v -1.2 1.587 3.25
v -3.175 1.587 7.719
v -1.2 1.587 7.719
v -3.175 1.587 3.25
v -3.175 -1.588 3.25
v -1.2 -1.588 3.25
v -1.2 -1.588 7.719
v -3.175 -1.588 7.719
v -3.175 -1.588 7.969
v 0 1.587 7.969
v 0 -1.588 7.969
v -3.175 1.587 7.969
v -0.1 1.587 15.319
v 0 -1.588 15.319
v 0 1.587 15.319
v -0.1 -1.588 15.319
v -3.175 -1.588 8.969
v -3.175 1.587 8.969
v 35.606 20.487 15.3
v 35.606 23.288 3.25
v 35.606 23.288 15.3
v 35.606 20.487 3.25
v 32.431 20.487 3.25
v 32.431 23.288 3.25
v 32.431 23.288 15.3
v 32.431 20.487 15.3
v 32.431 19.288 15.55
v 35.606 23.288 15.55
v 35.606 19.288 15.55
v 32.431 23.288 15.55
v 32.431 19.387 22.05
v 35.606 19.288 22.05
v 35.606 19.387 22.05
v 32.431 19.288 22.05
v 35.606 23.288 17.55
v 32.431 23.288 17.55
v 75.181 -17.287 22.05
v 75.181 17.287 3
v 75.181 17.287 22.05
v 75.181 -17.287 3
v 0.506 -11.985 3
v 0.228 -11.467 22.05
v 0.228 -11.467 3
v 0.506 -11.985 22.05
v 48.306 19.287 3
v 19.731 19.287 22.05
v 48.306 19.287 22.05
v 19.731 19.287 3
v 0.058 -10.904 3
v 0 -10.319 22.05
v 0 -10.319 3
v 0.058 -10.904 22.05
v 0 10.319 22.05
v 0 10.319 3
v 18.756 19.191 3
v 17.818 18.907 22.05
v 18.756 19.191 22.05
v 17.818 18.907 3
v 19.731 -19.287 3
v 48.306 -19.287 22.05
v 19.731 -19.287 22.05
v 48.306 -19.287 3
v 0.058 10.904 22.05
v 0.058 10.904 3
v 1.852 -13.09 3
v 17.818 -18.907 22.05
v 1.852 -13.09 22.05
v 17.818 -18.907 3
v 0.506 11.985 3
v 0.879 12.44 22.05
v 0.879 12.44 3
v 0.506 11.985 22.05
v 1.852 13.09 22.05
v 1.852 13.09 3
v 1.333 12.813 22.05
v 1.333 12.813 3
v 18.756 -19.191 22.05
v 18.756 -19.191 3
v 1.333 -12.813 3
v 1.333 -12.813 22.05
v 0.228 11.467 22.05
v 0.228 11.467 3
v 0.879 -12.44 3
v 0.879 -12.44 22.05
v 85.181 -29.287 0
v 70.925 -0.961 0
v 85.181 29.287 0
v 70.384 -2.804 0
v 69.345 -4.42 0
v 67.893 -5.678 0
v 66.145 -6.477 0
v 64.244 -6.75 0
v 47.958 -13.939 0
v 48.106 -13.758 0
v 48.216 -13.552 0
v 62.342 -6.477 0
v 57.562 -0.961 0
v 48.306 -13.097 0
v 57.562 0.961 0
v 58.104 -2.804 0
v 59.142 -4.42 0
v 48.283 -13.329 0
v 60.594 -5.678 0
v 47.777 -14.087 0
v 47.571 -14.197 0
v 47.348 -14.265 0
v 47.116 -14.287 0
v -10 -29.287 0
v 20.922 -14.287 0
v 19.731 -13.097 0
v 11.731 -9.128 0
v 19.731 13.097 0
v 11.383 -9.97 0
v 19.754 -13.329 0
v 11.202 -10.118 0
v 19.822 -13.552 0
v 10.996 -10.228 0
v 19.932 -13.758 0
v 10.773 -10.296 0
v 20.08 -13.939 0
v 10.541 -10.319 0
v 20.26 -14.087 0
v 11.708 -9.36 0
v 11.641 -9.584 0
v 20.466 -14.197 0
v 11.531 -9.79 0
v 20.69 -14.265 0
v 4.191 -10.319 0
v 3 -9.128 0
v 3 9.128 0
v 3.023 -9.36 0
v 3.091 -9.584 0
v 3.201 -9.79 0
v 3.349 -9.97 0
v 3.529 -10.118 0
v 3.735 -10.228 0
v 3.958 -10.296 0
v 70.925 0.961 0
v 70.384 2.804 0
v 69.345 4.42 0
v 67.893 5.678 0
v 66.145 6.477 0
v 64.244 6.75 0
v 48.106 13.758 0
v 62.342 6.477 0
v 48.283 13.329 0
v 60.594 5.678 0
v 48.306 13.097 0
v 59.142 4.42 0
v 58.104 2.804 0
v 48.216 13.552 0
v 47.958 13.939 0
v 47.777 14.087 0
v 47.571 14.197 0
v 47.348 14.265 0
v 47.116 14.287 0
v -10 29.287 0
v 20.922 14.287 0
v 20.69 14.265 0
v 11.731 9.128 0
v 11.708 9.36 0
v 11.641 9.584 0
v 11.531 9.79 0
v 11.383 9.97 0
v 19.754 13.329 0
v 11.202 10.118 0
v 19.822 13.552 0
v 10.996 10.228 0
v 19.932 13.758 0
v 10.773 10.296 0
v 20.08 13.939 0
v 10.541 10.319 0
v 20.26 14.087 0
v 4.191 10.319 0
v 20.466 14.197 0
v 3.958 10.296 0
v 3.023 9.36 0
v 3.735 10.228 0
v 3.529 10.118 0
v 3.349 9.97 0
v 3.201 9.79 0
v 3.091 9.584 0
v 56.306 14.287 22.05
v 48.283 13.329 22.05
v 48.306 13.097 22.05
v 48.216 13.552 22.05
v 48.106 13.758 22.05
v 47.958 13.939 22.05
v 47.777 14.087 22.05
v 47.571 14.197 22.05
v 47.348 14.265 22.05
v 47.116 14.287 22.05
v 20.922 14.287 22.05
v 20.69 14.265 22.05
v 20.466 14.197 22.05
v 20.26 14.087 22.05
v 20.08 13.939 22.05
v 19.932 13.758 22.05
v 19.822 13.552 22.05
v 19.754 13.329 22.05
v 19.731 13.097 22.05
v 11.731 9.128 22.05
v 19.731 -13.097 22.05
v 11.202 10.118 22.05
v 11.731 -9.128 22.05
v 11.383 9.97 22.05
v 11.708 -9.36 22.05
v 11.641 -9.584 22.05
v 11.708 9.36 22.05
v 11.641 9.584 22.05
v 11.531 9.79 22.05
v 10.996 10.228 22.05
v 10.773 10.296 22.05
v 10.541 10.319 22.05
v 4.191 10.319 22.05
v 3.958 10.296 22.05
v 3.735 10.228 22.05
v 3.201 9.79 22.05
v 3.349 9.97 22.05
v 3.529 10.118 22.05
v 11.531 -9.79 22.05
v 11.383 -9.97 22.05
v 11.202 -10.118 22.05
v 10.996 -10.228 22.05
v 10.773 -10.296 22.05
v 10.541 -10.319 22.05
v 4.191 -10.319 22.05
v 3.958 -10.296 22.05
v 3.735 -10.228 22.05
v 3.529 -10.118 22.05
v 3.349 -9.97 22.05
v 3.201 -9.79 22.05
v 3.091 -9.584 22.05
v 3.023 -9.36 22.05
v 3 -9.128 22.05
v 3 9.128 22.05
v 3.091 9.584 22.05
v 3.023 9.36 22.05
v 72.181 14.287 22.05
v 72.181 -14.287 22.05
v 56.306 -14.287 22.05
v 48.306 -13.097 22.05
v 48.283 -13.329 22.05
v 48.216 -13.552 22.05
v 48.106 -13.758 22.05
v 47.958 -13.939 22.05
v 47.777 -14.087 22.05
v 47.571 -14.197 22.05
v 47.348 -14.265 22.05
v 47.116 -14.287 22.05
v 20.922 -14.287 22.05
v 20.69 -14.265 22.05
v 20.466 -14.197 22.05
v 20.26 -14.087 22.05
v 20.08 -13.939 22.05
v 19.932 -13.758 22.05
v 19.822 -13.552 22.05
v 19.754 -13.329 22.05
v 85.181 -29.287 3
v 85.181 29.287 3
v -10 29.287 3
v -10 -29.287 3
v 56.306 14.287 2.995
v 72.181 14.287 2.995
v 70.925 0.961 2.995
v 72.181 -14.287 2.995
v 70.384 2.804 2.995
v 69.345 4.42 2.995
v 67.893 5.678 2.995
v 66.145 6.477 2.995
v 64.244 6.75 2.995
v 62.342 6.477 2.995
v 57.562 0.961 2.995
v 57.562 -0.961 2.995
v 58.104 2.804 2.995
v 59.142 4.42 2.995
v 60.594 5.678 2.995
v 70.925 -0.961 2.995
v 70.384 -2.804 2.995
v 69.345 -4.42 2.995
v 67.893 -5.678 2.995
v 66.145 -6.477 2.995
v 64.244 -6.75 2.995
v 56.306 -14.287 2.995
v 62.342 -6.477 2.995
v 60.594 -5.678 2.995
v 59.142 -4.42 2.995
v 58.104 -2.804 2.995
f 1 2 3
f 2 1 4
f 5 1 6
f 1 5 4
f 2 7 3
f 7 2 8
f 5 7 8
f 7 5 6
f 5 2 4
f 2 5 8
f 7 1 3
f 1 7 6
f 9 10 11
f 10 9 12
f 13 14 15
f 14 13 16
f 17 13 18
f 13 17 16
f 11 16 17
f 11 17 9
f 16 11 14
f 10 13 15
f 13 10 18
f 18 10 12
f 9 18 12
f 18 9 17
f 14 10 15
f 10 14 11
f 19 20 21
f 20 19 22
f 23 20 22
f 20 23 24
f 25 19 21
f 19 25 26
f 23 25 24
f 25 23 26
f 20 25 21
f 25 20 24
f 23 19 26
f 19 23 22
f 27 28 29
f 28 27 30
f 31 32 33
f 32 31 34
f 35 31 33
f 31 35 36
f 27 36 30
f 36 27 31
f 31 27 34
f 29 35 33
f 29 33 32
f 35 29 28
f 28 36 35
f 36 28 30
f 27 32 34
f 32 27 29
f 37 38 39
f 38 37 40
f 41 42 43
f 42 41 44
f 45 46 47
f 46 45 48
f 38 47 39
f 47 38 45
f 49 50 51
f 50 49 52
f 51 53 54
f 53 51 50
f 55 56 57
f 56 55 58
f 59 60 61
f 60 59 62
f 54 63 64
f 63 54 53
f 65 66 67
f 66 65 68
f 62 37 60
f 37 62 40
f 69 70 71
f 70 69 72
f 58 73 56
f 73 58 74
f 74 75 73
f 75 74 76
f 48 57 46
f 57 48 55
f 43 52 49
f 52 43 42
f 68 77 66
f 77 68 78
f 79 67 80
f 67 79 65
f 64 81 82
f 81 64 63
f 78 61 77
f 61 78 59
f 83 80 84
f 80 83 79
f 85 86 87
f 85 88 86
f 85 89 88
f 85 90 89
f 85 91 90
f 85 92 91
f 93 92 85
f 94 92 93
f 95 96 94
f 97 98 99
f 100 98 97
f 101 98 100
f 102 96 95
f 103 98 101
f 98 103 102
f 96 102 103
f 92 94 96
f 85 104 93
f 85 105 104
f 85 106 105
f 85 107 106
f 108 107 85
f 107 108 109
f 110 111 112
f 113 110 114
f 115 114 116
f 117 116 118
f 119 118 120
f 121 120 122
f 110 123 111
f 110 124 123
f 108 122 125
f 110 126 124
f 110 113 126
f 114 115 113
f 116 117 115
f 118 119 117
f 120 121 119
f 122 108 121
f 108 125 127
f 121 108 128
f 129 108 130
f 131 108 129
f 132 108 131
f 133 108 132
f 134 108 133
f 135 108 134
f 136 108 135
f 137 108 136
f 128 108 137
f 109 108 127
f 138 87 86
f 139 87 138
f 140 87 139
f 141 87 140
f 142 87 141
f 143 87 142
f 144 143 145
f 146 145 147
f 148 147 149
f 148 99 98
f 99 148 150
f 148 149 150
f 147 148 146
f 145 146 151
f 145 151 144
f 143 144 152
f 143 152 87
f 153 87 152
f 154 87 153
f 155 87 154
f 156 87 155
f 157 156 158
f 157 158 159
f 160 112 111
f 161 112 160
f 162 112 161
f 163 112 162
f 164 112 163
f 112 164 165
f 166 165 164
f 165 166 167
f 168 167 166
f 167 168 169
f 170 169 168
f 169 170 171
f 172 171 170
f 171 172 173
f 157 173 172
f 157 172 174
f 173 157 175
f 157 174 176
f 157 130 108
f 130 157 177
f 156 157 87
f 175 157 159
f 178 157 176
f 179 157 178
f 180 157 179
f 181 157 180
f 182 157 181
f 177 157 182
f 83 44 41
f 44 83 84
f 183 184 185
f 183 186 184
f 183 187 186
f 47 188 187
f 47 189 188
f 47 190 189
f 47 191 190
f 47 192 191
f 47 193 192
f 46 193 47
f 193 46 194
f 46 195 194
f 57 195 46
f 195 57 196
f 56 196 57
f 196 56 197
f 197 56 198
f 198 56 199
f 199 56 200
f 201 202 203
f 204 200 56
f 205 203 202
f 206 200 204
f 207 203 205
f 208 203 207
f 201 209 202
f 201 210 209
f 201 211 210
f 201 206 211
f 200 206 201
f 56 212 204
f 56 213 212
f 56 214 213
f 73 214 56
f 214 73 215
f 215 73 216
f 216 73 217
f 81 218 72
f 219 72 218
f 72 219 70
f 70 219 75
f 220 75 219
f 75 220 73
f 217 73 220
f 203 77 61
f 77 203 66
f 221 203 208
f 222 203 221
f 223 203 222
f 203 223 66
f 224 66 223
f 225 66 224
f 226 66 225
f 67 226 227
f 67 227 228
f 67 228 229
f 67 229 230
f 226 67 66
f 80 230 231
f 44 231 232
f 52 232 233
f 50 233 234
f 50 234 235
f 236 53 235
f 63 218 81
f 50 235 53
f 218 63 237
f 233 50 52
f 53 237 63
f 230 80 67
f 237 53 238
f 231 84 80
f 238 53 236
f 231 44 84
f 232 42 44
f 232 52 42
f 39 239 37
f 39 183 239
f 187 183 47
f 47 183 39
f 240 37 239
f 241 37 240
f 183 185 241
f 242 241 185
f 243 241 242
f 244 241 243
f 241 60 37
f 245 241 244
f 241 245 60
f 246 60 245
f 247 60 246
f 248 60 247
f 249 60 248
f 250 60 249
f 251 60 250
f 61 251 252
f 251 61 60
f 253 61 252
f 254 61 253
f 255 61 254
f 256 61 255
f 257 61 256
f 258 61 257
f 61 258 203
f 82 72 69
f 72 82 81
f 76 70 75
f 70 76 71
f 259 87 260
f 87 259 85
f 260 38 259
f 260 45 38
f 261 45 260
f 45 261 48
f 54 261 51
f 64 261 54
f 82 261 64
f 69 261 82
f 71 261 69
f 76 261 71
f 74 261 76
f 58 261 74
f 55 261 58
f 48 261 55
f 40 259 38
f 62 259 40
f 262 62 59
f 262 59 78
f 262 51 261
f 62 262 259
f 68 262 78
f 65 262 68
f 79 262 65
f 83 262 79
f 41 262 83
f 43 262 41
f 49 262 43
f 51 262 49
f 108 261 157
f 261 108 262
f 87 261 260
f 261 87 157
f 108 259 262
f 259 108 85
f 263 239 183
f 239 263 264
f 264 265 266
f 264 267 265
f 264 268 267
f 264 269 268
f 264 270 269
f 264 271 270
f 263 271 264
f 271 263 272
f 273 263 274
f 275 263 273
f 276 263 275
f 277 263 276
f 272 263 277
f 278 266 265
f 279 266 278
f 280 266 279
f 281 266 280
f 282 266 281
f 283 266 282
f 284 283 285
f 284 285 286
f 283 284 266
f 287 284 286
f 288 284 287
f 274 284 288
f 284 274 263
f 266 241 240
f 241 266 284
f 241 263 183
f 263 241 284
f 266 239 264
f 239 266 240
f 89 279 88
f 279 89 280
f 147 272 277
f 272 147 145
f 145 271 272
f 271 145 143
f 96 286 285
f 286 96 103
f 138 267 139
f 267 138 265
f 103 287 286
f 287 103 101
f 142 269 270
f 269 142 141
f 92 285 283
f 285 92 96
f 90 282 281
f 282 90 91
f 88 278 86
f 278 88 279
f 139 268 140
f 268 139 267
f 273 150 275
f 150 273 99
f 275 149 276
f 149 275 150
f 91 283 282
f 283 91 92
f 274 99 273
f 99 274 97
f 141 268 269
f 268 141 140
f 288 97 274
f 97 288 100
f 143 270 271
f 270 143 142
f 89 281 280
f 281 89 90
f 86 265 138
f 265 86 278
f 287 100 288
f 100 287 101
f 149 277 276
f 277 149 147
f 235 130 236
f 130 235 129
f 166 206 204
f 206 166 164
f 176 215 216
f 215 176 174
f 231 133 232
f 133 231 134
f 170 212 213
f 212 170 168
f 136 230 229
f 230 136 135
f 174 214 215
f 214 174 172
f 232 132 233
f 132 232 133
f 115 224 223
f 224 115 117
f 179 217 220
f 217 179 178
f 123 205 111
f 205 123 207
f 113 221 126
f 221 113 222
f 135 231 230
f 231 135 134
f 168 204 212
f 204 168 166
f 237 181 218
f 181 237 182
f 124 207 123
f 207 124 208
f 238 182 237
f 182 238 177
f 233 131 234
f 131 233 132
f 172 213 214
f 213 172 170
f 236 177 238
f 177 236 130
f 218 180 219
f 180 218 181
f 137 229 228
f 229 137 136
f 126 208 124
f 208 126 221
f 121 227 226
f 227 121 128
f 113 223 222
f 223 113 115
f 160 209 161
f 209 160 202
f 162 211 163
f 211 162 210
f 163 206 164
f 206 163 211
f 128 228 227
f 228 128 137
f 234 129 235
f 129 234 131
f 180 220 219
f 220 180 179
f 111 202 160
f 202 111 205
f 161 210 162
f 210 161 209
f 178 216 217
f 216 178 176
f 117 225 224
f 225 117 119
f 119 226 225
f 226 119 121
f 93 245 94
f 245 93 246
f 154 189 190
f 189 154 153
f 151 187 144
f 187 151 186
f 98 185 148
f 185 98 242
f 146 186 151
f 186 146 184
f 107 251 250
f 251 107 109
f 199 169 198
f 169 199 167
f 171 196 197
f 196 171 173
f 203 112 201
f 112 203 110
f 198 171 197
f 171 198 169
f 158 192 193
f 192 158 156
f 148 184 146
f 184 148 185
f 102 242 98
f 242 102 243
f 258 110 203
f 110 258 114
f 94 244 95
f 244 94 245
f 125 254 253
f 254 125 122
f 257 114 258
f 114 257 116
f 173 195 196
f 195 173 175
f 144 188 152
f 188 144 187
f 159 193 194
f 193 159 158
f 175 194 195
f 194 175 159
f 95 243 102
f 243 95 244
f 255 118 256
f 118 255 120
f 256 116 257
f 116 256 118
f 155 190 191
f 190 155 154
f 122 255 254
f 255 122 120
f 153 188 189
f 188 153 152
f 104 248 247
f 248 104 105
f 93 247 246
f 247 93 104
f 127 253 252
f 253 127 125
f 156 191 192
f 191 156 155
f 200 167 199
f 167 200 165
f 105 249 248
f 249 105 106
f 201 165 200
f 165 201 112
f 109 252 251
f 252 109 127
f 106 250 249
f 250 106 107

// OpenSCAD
// file: switch.scad
function switchx() = 9/8*25.4;
function switchy() = 5/8*25.4;
function switchwall() = 3;
module switch(d=3,s=1) {
    x=switchx();
    y=switchy();
    z=3/4*25.4;
    w=switchwall();
    r=1/2*25.4/2+.4;
    if (s==1) {
        translate([0,0,(z+d)/2]) cube([x+2*w,y+2*w,z+d],true);
    } else {
        translate([0,0,z/2+d]) cube([x,y,z+0.01],true);
        translate([0,0,-0.005]) cylinder(r=r,h=d+0.01);
    }
}
module test() {
    difference() {
        union() {
            translate([0,0,1.5]) cube([switchx()+2*switchwall()+10,switchy()+2*switchwall()+10,3],true);
            switch(d=3,s=1);
        }
        switch(d=3,s=0);
    }
}

module barmount(d=1.6*25.4) {
    zipt=4;
    zipw=8;
    w=2;
    sz=(d+4*w+2*zipt)/2;
    y=switchx()+2*switchwall();
    translate([0,0,(d+4*w+2*zipt)/2+.5]) rotate([-90,0,0]) intersection() {
        //difference() {
        //    translate([0,0,100]) cube(200,true);
            rotate([-60,0,0]) translate([0,0,90]) cube(200,true);
        //}
        difference() {
            union() {
                translate([0,sz,(d+4*w+2.5*zipt+switchy())/2]) rotate([90,0,0]) switch(d=3,s=1);
                hull() {
                    translate([0,sz/2,(d+4*w+2.5*zipt)/2]) cube([y,sz,0.01],true);
                    rotate([0,90,0]) cylinder(d=d+4*w+2*zipt,h=y,center=true);
                }
            }
            rotate([0,90,0]) cylinder(d=d,h=y+0.01,center=true);
            for (m=[0,1]) mirror([m,0,0]) translate([zipw/2-y/2+w,0,0]) rotate([0,90,0]) difference() {
                cylinder(d=d+2*w+2*zipt,h=zipw,center=true);
                cylinder(d=d+2*w,h=zipw+0.01,center=true);
            }
                translate([0,sz,(d+4*w+2.5*zipt+switchy())/2]) rotate([90,0,0]) switch(d=3,s=0);
        }
    }
}
barmount();
// file: relay.scad
function relayx() = 9/8*25.4;
function relayy() = 9/8*25.4;
function relaywall() = 5;
module relay(d=3,s=1,e=0,er=0) {
    x=relayx();
    y=relayy();
    z=3/4*25.4;
    tx=1/8*25.4;
    tz=2;
    ty=4;
    tsz=4.5;
    th=0;
    r=3/64*25.4;
    w=relaywall();
    $fn=32;
    translate([-x/2,-y/2,z+d])
    mirror([0,0,1])
    if (s==2) {
        translate([x/2-tx/2,y+w,th]) translate([0,1.2,tz+tsz+.25]) cube([tx,ty-1.2,z-d*1.5-tz-0.5]);
        translate([x/2-tx/2,y+w,th]) hull() {
            translate([0,0,tsz]) cube([tx,ty,tz]);
            cube([tx,0.1,.1]);
        }
    } else if (s==1) {
        linear_extrude(z+d) offset(r=w) square([x,y]);
    } else {
        translate([0,0,-0.005]) linear_extrude(z+d+0.01) offset(r=r) offset(r=-r) square([x,y]);
        if (e>0) {
            difference() {
                translate([0,0,e-d-0.005]) linear_extrude(e+d) offset(r=er) square([x,y]);
                if (er>=1) {
                    difference() {
                        translate([0,0,.25+e-d-0.005]) linear_extrude(e+d-.25) offset(r=0.3) square([x,y]);
                        translate([0,0,e-d-0.005]) linear_extrude(e+d+.25) offset(r=r+.7) offset(r=-r) square([x,y]);
                    }
                }
            }
        }
    }
}

module test () {
    translate([0,-y/2-w-1]) difference() {
        union() {
            translate([0,0,-14+1.5]) cube([relayx()+2*relaywall()+10,relayy()+2*relaywall()+10,28],true);
            relay(d=3,s=1);
            relay(d=3,s=2);
        }
        relay(d=3,s=0,e=25,er=1);
    }
}
test();
// file: fuse.scad
gap=0.3;
function fusex() = 13/16*25.4;
function fusey() = 11/32*25.4;
function fusewall() = 3;
module fuse(d=3,s=1,e=0,er=0) {
    x=fusex();
    y=fusey();
    z=3/4*25.4;
    tx=1/8*25.4;
    tz=1;
    ty=1/8*25.4;
    tsz=2*ty;
    th=(11/32)*25.4-2;
    r=3/64*25.4;
    w=fusewall();
    $fn=32;
    translate([-x/2,-y/2,z+d])
    mirror([0,0,1])
    if (s==2) {
        translate([x/2-tx/2,y+w,th]) translate([0,1.2,tsz+tz+.25]) cube([tx,ty-1.2,z-th-tsz-tz-0.5]);
        translate([x/2-tx/2,y+w,th]) hull() {
            translate([0,0,tsz]) cube([tx,ty,tz]);
            cube([tx,0.1,.1]);
        }
    } else if (s==1) {
        linear_extrude(z+d) offset(r=w) square([x,y]);
    } else {
        translate([0,0,-0.5]) linear_extrude(z+d+1) offset(r=r) offset(r=-r) square([x,y]);
        if (e>0) {
            difference() {
                translate([0,0,e-d-0.005]) linear_extrude(e+d+0.56) offset(r=er) square([x,y]);
                if (er>=1) {
                    difference() {
                        translate([0,0,0.25+e-d-0.005]) linear_extrude(e+d+0.56-.25) offset(r=.3) square([x,y]);
                        translate([0,0,e-d-0.005]) linear_extrude(e+d+0.56+.25) offset(r=r-.7) offset(r=-r) square([x,y]);
                    }
                }
            }
        }
    }
}

module test() {
    difference() {
        union() {
            translate([0,0,-14+3]) cube([fusex()+fusewall()+10,fusey()+fusewall()+10,25+3],true);
            fuse(3,1);
            fuse(3,2);
        }
        fuse(3,0,25,3);
    }
}
test();
// main file
use <fuse.scad>;
use <relay.scad>;
use <switch.scad>;

sizex=fusey()+fusewall()*2+relayx()+relaywall()*2+switchy()+switchwall()*2;
sizey=relayy()+relaywall()*2;

difference() {
    union() {
        translate([-10,-10-sizey/2]) cube([20+sizex,sizey+20,3]);
        union() {
            hull() {                    
                translate([fusey()/2+fusewall(),0,0]) rotate(90) fuse(d=3,s=1);
                translate([fusey()+fusewall()*2+relayx()/2+relaywall(),0,0]) relay(d=3,s=1);
                translate([fusey()+fusewall()*2+relayx()+relaywall()*2+switchwall()+switchy()/2,0,0]) rotate(90) switch(d=3,s=1);
            }                    
                translate([fusey()/2+fusewall(),0,0]) rotate(90) fuse(d=3,s=2);
                translate([fusey()+fusewall()*2+relayx()/2+relaywall(),0,0]) relay(d=3,s=2);
        }
    }                    
    translate([fusey()/2+fusewall(),0,0]) rotate(90) fuse(d=3,s=0);
    translate([fusey()+fusewall()*2+relayx()/2+relaywall(),0,0]) relay(d=3,s=0);
    translate([fusey()+fusewall()*2+relayx()+relaywall()*2+switchwall()+switchy()/2,0,0]) rotate(90) switch(d=3,s=0);
}
